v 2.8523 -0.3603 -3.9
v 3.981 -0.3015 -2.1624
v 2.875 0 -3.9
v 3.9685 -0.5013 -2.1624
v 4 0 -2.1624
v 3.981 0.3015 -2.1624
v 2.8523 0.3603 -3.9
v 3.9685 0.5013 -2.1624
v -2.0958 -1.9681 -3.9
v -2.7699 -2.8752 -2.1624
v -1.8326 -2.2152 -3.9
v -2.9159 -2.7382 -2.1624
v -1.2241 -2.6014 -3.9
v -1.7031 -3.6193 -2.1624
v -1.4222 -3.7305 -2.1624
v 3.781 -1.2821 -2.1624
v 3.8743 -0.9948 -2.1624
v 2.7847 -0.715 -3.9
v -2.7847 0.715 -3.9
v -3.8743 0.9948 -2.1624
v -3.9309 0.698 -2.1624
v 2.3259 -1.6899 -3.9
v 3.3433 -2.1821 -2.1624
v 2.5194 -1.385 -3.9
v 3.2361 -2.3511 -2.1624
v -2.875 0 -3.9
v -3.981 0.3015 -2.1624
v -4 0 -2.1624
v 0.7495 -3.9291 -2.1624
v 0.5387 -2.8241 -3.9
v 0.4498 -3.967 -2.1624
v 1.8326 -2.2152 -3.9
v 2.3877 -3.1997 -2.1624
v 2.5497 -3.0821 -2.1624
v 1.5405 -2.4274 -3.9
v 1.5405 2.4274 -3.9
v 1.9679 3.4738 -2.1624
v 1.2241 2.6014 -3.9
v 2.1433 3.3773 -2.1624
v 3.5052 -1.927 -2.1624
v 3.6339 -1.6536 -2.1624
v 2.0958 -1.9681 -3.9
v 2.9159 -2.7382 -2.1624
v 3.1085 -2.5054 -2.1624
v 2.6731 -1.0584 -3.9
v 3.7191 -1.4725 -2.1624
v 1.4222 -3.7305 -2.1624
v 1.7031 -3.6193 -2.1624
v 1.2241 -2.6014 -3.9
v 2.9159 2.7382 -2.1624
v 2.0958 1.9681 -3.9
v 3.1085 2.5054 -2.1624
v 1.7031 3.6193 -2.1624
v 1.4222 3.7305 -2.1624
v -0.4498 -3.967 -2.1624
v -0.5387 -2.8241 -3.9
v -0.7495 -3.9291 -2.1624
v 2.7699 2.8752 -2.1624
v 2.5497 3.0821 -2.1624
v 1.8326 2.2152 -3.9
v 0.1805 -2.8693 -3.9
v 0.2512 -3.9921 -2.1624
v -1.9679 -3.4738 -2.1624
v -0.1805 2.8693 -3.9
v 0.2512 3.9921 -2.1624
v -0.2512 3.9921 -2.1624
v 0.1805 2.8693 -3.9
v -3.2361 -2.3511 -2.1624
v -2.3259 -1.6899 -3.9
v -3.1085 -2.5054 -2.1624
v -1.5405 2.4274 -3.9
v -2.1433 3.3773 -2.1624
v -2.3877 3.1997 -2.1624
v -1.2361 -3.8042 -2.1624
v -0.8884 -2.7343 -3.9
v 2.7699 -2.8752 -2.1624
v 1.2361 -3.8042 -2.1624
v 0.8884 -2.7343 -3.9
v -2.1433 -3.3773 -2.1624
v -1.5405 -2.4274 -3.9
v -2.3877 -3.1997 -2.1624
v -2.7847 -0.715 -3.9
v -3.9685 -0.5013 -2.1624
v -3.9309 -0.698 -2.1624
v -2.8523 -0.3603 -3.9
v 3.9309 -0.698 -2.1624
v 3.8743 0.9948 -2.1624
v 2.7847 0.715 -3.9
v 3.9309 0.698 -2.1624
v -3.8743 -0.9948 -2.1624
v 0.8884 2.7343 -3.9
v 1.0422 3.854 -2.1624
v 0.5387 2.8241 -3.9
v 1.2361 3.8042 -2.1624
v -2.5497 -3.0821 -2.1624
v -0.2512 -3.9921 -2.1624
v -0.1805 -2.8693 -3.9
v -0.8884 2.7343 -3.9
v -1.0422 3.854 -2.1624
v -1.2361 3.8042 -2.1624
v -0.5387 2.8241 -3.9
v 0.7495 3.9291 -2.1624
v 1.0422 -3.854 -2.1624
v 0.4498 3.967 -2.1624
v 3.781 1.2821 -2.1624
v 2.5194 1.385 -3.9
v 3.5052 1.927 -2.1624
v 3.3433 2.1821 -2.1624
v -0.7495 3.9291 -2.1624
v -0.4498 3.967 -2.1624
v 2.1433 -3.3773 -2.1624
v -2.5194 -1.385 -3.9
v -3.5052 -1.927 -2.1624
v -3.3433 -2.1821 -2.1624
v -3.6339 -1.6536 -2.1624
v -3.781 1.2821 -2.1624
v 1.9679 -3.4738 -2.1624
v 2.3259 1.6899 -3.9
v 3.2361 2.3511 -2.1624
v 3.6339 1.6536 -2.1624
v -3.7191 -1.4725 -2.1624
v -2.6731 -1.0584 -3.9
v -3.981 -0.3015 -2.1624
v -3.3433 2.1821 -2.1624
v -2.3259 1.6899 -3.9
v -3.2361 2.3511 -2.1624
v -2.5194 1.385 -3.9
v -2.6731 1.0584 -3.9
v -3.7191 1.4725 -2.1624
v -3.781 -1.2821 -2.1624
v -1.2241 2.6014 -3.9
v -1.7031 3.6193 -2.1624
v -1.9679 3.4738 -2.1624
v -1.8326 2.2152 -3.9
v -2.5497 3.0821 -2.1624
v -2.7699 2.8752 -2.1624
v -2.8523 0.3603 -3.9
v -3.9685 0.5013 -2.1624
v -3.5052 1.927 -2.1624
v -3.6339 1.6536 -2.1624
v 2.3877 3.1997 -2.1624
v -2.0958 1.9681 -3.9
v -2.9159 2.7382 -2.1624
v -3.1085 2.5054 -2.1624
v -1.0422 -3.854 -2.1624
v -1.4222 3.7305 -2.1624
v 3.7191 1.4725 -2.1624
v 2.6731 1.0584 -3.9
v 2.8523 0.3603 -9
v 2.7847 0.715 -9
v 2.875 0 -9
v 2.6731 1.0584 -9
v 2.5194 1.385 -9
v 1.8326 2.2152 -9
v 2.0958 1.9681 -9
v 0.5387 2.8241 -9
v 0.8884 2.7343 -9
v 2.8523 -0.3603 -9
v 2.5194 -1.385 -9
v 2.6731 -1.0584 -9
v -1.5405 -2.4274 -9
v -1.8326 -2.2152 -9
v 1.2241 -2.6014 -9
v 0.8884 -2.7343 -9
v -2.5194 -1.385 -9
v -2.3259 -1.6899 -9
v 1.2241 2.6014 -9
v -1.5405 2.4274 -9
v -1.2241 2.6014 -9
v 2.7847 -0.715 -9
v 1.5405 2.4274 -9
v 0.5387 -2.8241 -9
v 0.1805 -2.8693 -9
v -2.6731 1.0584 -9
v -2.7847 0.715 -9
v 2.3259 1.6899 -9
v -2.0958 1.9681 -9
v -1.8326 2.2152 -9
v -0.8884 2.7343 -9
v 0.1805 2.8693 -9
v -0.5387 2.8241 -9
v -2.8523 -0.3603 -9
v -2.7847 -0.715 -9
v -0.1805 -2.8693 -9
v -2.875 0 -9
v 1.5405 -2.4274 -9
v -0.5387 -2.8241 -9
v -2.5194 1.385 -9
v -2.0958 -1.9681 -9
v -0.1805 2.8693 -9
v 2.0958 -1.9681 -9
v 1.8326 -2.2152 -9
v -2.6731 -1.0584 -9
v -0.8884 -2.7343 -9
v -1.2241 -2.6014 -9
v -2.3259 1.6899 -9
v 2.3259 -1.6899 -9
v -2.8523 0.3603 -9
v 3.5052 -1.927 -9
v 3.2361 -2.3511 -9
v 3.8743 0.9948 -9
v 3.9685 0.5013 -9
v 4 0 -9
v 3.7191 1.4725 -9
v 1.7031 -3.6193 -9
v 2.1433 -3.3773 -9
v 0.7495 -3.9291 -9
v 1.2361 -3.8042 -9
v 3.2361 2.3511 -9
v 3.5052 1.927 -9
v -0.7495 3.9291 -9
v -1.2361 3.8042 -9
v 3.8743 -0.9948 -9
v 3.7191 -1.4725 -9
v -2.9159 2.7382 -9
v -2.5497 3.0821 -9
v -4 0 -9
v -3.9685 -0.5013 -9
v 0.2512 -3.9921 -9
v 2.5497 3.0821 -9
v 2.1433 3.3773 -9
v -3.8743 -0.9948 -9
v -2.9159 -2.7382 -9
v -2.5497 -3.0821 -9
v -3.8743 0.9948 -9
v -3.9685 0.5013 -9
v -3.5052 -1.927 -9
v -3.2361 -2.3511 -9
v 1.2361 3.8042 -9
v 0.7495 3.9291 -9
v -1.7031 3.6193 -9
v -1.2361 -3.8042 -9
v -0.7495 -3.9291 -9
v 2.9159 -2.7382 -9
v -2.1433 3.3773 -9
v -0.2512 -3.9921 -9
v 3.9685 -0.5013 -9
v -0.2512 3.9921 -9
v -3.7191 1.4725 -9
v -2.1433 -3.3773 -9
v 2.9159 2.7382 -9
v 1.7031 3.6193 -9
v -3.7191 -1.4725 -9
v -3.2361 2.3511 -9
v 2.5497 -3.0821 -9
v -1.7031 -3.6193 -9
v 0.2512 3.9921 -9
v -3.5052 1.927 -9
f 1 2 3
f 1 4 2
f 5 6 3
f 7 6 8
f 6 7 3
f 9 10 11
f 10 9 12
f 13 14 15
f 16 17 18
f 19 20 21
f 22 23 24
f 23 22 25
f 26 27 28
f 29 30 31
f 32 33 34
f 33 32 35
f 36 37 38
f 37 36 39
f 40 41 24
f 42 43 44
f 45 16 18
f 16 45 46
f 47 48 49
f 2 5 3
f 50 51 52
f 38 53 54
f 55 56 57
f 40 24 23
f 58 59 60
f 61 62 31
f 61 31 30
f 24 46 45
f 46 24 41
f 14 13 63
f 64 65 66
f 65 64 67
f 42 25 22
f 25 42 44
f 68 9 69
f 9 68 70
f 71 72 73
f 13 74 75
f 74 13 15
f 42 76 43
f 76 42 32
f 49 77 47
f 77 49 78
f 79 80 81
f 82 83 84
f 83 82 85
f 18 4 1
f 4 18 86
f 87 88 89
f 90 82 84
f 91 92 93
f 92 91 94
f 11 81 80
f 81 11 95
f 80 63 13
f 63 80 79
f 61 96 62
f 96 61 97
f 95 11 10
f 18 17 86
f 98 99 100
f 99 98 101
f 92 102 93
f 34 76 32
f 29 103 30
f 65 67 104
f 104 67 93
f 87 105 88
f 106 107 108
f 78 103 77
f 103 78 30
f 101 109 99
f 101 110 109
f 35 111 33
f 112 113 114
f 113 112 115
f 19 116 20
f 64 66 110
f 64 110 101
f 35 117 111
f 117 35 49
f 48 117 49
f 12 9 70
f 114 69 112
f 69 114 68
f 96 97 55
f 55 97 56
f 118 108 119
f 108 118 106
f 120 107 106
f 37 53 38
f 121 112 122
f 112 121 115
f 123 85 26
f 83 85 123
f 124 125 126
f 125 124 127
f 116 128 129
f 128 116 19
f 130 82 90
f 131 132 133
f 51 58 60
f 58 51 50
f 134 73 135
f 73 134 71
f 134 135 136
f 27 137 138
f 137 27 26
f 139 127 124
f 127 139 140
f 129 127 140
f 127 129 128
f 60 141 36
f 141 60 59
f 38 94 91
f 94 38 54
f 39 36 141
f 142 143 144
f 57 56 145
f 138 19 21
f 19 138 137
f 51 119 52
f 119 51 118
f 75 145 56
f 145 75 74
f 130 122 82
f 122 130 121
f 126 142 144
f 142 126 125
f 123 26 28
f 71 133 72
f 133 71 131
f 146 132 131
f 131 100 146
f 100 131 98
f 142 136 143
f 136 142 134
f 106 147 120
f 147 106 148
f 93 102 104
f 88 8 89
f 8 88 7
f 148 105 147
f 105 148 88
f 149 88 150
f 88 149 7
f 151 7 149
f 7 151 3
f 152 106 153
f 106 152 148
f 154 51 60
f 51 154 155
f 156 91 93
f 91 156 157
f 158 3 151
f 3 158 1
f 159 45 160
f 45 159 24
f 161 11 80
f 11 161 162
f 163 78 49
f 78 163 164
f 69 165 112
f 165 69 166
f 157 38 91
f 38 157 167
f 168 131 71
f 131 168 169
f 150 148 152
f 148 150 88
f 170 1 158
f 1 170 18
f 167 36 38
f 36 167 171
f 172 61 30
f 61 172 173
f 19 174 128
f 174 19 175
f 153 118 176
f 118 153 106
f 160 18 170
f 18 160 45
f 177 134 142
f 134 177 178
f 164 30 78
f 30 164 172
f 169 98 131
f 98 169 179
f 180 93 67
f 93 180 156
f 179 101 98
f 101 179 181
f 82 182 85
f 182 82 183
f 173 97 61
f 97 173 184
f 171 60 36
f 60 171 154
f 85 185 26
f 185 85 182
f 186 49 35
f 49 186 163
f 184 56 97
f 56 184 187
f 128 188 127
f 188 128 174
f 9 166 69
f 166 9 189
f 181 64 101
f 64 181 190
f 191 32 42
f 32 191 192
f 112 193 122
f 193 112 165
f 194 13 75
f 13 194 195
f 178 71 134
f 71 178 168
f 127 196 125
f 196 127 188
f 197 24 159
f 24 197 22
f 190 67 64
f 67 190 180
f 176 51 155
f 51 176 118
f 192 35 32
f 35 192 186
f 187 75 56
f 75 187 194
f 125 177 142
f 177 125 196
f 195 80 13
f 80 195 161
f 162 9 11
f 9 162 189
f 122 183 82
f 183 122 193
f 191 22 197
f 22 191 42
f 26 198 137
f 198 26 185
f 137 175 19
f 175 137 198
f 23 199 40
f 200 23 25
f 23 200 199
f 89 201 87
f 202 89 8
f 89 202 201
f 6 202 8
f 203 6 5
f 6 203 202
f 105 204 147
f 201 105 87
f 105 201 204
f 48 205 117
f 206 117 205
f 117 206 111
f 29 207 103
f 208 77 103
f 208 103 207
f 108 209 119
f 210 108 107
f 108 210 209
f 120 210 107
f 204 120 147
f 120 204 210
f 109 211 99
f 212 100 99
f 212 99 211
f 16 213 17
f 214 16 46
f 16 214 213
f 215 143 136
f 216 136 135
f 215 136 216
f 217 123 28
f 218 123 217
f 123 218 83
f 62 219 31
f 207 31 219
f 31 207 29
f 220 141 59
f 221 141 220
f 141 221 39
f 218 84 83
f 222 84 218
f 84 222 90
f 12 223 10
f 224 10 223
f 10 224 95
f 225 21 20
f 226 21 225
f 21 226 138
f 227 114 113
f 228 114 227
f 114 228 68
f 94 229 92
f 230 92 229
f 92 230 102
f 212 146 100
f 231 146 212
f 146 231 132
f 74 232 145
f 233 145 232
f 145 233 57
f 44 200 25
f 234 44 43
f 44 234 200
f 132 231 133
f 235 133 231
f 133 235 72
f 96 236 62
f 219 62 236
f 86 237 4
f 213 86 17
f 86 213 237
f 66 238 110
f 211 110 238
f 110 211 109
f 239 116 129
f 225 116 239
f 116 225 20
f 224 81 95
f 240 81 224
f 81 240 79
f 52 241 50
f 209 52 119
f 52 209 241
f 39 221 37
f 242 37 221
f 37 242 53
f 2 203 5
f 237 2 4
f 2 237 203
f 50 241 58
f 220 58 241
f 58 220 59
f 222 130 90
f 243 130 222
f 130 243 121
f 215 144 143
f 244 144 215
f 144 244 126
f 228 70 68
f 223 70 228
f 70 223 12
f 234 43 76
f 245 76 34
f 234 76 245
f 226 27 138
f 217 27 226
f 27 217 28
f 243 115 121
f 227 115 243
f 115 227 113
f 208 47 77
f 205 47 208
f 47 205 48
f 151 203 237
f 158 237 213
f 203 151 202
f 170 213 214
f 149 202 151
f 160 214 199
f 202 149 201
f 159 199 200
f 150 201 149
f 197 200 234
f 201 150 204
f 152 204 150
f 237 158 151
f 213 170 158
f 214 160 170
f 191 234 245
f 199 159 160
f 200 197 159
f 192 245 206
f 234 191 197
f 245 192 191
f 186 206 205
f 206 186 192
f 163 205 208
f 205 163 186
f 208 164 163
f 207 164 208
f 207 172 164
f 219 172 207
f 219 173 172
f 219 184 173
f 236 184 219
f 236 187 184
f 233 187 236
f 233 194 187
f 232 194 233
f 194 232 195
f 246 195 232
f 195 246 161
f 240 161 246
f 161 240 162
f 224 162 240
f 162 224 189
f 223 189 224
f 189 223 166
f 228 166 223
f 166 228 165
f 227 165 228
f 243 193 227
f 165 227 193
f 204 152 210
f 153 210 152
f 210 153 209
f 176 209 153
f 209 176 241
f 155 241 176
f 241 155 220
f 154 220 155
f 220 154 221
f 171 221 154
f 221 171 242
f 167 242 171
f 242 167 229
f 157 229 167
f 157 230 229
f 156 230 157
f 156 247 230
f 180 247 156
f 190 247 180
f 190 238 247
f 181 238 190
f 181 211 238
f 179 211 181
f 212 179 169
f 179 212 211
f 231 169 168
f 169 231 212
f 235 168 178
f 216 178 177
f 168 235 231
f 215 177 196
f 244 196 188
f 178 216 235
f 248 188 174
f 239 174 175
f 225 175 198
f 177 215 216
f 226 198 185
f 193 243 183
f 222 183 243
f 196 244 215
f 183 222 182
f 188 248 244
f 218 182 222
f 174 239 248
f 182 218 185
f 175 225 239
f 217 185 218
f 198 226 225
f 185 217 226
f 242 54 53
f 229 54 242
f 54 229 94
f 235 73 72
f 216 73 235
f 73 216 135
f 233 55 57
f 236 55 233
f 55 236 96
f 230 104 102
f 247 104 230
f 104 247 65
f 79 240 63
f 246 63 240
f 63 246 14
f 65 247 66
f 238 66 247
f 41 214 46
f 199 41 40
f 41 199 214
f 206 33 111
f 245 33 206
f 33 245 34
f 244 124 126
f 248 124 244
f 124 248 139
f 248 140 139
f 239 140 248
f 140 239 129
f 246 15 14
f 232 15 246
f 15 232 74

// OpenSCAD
$fn = 50;

difference() {
	union() {
		translate(v = [0, 0, -9.0]) {
			cylinder(h = 9, r = 4.0);
		}
	}
	union() {
		translate(v = [0, 0, 0]) {
			rotate(a = [0, 0, 0]) {
				difference() {
					union() {
						translate(v = [0, 0, -12.0]) {
							cylinder(h = 12, r = 2.6);
						}
						translate(v = [0, 0, -3.9]) {
							cylinder(h = 3.9, r1 = 2.875, r2 = 5.4);
						}
						translate(v = [0, 0, -12.0]) {
							cylinder(h = 12, r = 2.875);
						}
						translate(v = [0, 0, -12.0]) {
							cylinder(h = 12, r = 2.6);
						}
					}
					union();
				}
			}
		}
	}
}
